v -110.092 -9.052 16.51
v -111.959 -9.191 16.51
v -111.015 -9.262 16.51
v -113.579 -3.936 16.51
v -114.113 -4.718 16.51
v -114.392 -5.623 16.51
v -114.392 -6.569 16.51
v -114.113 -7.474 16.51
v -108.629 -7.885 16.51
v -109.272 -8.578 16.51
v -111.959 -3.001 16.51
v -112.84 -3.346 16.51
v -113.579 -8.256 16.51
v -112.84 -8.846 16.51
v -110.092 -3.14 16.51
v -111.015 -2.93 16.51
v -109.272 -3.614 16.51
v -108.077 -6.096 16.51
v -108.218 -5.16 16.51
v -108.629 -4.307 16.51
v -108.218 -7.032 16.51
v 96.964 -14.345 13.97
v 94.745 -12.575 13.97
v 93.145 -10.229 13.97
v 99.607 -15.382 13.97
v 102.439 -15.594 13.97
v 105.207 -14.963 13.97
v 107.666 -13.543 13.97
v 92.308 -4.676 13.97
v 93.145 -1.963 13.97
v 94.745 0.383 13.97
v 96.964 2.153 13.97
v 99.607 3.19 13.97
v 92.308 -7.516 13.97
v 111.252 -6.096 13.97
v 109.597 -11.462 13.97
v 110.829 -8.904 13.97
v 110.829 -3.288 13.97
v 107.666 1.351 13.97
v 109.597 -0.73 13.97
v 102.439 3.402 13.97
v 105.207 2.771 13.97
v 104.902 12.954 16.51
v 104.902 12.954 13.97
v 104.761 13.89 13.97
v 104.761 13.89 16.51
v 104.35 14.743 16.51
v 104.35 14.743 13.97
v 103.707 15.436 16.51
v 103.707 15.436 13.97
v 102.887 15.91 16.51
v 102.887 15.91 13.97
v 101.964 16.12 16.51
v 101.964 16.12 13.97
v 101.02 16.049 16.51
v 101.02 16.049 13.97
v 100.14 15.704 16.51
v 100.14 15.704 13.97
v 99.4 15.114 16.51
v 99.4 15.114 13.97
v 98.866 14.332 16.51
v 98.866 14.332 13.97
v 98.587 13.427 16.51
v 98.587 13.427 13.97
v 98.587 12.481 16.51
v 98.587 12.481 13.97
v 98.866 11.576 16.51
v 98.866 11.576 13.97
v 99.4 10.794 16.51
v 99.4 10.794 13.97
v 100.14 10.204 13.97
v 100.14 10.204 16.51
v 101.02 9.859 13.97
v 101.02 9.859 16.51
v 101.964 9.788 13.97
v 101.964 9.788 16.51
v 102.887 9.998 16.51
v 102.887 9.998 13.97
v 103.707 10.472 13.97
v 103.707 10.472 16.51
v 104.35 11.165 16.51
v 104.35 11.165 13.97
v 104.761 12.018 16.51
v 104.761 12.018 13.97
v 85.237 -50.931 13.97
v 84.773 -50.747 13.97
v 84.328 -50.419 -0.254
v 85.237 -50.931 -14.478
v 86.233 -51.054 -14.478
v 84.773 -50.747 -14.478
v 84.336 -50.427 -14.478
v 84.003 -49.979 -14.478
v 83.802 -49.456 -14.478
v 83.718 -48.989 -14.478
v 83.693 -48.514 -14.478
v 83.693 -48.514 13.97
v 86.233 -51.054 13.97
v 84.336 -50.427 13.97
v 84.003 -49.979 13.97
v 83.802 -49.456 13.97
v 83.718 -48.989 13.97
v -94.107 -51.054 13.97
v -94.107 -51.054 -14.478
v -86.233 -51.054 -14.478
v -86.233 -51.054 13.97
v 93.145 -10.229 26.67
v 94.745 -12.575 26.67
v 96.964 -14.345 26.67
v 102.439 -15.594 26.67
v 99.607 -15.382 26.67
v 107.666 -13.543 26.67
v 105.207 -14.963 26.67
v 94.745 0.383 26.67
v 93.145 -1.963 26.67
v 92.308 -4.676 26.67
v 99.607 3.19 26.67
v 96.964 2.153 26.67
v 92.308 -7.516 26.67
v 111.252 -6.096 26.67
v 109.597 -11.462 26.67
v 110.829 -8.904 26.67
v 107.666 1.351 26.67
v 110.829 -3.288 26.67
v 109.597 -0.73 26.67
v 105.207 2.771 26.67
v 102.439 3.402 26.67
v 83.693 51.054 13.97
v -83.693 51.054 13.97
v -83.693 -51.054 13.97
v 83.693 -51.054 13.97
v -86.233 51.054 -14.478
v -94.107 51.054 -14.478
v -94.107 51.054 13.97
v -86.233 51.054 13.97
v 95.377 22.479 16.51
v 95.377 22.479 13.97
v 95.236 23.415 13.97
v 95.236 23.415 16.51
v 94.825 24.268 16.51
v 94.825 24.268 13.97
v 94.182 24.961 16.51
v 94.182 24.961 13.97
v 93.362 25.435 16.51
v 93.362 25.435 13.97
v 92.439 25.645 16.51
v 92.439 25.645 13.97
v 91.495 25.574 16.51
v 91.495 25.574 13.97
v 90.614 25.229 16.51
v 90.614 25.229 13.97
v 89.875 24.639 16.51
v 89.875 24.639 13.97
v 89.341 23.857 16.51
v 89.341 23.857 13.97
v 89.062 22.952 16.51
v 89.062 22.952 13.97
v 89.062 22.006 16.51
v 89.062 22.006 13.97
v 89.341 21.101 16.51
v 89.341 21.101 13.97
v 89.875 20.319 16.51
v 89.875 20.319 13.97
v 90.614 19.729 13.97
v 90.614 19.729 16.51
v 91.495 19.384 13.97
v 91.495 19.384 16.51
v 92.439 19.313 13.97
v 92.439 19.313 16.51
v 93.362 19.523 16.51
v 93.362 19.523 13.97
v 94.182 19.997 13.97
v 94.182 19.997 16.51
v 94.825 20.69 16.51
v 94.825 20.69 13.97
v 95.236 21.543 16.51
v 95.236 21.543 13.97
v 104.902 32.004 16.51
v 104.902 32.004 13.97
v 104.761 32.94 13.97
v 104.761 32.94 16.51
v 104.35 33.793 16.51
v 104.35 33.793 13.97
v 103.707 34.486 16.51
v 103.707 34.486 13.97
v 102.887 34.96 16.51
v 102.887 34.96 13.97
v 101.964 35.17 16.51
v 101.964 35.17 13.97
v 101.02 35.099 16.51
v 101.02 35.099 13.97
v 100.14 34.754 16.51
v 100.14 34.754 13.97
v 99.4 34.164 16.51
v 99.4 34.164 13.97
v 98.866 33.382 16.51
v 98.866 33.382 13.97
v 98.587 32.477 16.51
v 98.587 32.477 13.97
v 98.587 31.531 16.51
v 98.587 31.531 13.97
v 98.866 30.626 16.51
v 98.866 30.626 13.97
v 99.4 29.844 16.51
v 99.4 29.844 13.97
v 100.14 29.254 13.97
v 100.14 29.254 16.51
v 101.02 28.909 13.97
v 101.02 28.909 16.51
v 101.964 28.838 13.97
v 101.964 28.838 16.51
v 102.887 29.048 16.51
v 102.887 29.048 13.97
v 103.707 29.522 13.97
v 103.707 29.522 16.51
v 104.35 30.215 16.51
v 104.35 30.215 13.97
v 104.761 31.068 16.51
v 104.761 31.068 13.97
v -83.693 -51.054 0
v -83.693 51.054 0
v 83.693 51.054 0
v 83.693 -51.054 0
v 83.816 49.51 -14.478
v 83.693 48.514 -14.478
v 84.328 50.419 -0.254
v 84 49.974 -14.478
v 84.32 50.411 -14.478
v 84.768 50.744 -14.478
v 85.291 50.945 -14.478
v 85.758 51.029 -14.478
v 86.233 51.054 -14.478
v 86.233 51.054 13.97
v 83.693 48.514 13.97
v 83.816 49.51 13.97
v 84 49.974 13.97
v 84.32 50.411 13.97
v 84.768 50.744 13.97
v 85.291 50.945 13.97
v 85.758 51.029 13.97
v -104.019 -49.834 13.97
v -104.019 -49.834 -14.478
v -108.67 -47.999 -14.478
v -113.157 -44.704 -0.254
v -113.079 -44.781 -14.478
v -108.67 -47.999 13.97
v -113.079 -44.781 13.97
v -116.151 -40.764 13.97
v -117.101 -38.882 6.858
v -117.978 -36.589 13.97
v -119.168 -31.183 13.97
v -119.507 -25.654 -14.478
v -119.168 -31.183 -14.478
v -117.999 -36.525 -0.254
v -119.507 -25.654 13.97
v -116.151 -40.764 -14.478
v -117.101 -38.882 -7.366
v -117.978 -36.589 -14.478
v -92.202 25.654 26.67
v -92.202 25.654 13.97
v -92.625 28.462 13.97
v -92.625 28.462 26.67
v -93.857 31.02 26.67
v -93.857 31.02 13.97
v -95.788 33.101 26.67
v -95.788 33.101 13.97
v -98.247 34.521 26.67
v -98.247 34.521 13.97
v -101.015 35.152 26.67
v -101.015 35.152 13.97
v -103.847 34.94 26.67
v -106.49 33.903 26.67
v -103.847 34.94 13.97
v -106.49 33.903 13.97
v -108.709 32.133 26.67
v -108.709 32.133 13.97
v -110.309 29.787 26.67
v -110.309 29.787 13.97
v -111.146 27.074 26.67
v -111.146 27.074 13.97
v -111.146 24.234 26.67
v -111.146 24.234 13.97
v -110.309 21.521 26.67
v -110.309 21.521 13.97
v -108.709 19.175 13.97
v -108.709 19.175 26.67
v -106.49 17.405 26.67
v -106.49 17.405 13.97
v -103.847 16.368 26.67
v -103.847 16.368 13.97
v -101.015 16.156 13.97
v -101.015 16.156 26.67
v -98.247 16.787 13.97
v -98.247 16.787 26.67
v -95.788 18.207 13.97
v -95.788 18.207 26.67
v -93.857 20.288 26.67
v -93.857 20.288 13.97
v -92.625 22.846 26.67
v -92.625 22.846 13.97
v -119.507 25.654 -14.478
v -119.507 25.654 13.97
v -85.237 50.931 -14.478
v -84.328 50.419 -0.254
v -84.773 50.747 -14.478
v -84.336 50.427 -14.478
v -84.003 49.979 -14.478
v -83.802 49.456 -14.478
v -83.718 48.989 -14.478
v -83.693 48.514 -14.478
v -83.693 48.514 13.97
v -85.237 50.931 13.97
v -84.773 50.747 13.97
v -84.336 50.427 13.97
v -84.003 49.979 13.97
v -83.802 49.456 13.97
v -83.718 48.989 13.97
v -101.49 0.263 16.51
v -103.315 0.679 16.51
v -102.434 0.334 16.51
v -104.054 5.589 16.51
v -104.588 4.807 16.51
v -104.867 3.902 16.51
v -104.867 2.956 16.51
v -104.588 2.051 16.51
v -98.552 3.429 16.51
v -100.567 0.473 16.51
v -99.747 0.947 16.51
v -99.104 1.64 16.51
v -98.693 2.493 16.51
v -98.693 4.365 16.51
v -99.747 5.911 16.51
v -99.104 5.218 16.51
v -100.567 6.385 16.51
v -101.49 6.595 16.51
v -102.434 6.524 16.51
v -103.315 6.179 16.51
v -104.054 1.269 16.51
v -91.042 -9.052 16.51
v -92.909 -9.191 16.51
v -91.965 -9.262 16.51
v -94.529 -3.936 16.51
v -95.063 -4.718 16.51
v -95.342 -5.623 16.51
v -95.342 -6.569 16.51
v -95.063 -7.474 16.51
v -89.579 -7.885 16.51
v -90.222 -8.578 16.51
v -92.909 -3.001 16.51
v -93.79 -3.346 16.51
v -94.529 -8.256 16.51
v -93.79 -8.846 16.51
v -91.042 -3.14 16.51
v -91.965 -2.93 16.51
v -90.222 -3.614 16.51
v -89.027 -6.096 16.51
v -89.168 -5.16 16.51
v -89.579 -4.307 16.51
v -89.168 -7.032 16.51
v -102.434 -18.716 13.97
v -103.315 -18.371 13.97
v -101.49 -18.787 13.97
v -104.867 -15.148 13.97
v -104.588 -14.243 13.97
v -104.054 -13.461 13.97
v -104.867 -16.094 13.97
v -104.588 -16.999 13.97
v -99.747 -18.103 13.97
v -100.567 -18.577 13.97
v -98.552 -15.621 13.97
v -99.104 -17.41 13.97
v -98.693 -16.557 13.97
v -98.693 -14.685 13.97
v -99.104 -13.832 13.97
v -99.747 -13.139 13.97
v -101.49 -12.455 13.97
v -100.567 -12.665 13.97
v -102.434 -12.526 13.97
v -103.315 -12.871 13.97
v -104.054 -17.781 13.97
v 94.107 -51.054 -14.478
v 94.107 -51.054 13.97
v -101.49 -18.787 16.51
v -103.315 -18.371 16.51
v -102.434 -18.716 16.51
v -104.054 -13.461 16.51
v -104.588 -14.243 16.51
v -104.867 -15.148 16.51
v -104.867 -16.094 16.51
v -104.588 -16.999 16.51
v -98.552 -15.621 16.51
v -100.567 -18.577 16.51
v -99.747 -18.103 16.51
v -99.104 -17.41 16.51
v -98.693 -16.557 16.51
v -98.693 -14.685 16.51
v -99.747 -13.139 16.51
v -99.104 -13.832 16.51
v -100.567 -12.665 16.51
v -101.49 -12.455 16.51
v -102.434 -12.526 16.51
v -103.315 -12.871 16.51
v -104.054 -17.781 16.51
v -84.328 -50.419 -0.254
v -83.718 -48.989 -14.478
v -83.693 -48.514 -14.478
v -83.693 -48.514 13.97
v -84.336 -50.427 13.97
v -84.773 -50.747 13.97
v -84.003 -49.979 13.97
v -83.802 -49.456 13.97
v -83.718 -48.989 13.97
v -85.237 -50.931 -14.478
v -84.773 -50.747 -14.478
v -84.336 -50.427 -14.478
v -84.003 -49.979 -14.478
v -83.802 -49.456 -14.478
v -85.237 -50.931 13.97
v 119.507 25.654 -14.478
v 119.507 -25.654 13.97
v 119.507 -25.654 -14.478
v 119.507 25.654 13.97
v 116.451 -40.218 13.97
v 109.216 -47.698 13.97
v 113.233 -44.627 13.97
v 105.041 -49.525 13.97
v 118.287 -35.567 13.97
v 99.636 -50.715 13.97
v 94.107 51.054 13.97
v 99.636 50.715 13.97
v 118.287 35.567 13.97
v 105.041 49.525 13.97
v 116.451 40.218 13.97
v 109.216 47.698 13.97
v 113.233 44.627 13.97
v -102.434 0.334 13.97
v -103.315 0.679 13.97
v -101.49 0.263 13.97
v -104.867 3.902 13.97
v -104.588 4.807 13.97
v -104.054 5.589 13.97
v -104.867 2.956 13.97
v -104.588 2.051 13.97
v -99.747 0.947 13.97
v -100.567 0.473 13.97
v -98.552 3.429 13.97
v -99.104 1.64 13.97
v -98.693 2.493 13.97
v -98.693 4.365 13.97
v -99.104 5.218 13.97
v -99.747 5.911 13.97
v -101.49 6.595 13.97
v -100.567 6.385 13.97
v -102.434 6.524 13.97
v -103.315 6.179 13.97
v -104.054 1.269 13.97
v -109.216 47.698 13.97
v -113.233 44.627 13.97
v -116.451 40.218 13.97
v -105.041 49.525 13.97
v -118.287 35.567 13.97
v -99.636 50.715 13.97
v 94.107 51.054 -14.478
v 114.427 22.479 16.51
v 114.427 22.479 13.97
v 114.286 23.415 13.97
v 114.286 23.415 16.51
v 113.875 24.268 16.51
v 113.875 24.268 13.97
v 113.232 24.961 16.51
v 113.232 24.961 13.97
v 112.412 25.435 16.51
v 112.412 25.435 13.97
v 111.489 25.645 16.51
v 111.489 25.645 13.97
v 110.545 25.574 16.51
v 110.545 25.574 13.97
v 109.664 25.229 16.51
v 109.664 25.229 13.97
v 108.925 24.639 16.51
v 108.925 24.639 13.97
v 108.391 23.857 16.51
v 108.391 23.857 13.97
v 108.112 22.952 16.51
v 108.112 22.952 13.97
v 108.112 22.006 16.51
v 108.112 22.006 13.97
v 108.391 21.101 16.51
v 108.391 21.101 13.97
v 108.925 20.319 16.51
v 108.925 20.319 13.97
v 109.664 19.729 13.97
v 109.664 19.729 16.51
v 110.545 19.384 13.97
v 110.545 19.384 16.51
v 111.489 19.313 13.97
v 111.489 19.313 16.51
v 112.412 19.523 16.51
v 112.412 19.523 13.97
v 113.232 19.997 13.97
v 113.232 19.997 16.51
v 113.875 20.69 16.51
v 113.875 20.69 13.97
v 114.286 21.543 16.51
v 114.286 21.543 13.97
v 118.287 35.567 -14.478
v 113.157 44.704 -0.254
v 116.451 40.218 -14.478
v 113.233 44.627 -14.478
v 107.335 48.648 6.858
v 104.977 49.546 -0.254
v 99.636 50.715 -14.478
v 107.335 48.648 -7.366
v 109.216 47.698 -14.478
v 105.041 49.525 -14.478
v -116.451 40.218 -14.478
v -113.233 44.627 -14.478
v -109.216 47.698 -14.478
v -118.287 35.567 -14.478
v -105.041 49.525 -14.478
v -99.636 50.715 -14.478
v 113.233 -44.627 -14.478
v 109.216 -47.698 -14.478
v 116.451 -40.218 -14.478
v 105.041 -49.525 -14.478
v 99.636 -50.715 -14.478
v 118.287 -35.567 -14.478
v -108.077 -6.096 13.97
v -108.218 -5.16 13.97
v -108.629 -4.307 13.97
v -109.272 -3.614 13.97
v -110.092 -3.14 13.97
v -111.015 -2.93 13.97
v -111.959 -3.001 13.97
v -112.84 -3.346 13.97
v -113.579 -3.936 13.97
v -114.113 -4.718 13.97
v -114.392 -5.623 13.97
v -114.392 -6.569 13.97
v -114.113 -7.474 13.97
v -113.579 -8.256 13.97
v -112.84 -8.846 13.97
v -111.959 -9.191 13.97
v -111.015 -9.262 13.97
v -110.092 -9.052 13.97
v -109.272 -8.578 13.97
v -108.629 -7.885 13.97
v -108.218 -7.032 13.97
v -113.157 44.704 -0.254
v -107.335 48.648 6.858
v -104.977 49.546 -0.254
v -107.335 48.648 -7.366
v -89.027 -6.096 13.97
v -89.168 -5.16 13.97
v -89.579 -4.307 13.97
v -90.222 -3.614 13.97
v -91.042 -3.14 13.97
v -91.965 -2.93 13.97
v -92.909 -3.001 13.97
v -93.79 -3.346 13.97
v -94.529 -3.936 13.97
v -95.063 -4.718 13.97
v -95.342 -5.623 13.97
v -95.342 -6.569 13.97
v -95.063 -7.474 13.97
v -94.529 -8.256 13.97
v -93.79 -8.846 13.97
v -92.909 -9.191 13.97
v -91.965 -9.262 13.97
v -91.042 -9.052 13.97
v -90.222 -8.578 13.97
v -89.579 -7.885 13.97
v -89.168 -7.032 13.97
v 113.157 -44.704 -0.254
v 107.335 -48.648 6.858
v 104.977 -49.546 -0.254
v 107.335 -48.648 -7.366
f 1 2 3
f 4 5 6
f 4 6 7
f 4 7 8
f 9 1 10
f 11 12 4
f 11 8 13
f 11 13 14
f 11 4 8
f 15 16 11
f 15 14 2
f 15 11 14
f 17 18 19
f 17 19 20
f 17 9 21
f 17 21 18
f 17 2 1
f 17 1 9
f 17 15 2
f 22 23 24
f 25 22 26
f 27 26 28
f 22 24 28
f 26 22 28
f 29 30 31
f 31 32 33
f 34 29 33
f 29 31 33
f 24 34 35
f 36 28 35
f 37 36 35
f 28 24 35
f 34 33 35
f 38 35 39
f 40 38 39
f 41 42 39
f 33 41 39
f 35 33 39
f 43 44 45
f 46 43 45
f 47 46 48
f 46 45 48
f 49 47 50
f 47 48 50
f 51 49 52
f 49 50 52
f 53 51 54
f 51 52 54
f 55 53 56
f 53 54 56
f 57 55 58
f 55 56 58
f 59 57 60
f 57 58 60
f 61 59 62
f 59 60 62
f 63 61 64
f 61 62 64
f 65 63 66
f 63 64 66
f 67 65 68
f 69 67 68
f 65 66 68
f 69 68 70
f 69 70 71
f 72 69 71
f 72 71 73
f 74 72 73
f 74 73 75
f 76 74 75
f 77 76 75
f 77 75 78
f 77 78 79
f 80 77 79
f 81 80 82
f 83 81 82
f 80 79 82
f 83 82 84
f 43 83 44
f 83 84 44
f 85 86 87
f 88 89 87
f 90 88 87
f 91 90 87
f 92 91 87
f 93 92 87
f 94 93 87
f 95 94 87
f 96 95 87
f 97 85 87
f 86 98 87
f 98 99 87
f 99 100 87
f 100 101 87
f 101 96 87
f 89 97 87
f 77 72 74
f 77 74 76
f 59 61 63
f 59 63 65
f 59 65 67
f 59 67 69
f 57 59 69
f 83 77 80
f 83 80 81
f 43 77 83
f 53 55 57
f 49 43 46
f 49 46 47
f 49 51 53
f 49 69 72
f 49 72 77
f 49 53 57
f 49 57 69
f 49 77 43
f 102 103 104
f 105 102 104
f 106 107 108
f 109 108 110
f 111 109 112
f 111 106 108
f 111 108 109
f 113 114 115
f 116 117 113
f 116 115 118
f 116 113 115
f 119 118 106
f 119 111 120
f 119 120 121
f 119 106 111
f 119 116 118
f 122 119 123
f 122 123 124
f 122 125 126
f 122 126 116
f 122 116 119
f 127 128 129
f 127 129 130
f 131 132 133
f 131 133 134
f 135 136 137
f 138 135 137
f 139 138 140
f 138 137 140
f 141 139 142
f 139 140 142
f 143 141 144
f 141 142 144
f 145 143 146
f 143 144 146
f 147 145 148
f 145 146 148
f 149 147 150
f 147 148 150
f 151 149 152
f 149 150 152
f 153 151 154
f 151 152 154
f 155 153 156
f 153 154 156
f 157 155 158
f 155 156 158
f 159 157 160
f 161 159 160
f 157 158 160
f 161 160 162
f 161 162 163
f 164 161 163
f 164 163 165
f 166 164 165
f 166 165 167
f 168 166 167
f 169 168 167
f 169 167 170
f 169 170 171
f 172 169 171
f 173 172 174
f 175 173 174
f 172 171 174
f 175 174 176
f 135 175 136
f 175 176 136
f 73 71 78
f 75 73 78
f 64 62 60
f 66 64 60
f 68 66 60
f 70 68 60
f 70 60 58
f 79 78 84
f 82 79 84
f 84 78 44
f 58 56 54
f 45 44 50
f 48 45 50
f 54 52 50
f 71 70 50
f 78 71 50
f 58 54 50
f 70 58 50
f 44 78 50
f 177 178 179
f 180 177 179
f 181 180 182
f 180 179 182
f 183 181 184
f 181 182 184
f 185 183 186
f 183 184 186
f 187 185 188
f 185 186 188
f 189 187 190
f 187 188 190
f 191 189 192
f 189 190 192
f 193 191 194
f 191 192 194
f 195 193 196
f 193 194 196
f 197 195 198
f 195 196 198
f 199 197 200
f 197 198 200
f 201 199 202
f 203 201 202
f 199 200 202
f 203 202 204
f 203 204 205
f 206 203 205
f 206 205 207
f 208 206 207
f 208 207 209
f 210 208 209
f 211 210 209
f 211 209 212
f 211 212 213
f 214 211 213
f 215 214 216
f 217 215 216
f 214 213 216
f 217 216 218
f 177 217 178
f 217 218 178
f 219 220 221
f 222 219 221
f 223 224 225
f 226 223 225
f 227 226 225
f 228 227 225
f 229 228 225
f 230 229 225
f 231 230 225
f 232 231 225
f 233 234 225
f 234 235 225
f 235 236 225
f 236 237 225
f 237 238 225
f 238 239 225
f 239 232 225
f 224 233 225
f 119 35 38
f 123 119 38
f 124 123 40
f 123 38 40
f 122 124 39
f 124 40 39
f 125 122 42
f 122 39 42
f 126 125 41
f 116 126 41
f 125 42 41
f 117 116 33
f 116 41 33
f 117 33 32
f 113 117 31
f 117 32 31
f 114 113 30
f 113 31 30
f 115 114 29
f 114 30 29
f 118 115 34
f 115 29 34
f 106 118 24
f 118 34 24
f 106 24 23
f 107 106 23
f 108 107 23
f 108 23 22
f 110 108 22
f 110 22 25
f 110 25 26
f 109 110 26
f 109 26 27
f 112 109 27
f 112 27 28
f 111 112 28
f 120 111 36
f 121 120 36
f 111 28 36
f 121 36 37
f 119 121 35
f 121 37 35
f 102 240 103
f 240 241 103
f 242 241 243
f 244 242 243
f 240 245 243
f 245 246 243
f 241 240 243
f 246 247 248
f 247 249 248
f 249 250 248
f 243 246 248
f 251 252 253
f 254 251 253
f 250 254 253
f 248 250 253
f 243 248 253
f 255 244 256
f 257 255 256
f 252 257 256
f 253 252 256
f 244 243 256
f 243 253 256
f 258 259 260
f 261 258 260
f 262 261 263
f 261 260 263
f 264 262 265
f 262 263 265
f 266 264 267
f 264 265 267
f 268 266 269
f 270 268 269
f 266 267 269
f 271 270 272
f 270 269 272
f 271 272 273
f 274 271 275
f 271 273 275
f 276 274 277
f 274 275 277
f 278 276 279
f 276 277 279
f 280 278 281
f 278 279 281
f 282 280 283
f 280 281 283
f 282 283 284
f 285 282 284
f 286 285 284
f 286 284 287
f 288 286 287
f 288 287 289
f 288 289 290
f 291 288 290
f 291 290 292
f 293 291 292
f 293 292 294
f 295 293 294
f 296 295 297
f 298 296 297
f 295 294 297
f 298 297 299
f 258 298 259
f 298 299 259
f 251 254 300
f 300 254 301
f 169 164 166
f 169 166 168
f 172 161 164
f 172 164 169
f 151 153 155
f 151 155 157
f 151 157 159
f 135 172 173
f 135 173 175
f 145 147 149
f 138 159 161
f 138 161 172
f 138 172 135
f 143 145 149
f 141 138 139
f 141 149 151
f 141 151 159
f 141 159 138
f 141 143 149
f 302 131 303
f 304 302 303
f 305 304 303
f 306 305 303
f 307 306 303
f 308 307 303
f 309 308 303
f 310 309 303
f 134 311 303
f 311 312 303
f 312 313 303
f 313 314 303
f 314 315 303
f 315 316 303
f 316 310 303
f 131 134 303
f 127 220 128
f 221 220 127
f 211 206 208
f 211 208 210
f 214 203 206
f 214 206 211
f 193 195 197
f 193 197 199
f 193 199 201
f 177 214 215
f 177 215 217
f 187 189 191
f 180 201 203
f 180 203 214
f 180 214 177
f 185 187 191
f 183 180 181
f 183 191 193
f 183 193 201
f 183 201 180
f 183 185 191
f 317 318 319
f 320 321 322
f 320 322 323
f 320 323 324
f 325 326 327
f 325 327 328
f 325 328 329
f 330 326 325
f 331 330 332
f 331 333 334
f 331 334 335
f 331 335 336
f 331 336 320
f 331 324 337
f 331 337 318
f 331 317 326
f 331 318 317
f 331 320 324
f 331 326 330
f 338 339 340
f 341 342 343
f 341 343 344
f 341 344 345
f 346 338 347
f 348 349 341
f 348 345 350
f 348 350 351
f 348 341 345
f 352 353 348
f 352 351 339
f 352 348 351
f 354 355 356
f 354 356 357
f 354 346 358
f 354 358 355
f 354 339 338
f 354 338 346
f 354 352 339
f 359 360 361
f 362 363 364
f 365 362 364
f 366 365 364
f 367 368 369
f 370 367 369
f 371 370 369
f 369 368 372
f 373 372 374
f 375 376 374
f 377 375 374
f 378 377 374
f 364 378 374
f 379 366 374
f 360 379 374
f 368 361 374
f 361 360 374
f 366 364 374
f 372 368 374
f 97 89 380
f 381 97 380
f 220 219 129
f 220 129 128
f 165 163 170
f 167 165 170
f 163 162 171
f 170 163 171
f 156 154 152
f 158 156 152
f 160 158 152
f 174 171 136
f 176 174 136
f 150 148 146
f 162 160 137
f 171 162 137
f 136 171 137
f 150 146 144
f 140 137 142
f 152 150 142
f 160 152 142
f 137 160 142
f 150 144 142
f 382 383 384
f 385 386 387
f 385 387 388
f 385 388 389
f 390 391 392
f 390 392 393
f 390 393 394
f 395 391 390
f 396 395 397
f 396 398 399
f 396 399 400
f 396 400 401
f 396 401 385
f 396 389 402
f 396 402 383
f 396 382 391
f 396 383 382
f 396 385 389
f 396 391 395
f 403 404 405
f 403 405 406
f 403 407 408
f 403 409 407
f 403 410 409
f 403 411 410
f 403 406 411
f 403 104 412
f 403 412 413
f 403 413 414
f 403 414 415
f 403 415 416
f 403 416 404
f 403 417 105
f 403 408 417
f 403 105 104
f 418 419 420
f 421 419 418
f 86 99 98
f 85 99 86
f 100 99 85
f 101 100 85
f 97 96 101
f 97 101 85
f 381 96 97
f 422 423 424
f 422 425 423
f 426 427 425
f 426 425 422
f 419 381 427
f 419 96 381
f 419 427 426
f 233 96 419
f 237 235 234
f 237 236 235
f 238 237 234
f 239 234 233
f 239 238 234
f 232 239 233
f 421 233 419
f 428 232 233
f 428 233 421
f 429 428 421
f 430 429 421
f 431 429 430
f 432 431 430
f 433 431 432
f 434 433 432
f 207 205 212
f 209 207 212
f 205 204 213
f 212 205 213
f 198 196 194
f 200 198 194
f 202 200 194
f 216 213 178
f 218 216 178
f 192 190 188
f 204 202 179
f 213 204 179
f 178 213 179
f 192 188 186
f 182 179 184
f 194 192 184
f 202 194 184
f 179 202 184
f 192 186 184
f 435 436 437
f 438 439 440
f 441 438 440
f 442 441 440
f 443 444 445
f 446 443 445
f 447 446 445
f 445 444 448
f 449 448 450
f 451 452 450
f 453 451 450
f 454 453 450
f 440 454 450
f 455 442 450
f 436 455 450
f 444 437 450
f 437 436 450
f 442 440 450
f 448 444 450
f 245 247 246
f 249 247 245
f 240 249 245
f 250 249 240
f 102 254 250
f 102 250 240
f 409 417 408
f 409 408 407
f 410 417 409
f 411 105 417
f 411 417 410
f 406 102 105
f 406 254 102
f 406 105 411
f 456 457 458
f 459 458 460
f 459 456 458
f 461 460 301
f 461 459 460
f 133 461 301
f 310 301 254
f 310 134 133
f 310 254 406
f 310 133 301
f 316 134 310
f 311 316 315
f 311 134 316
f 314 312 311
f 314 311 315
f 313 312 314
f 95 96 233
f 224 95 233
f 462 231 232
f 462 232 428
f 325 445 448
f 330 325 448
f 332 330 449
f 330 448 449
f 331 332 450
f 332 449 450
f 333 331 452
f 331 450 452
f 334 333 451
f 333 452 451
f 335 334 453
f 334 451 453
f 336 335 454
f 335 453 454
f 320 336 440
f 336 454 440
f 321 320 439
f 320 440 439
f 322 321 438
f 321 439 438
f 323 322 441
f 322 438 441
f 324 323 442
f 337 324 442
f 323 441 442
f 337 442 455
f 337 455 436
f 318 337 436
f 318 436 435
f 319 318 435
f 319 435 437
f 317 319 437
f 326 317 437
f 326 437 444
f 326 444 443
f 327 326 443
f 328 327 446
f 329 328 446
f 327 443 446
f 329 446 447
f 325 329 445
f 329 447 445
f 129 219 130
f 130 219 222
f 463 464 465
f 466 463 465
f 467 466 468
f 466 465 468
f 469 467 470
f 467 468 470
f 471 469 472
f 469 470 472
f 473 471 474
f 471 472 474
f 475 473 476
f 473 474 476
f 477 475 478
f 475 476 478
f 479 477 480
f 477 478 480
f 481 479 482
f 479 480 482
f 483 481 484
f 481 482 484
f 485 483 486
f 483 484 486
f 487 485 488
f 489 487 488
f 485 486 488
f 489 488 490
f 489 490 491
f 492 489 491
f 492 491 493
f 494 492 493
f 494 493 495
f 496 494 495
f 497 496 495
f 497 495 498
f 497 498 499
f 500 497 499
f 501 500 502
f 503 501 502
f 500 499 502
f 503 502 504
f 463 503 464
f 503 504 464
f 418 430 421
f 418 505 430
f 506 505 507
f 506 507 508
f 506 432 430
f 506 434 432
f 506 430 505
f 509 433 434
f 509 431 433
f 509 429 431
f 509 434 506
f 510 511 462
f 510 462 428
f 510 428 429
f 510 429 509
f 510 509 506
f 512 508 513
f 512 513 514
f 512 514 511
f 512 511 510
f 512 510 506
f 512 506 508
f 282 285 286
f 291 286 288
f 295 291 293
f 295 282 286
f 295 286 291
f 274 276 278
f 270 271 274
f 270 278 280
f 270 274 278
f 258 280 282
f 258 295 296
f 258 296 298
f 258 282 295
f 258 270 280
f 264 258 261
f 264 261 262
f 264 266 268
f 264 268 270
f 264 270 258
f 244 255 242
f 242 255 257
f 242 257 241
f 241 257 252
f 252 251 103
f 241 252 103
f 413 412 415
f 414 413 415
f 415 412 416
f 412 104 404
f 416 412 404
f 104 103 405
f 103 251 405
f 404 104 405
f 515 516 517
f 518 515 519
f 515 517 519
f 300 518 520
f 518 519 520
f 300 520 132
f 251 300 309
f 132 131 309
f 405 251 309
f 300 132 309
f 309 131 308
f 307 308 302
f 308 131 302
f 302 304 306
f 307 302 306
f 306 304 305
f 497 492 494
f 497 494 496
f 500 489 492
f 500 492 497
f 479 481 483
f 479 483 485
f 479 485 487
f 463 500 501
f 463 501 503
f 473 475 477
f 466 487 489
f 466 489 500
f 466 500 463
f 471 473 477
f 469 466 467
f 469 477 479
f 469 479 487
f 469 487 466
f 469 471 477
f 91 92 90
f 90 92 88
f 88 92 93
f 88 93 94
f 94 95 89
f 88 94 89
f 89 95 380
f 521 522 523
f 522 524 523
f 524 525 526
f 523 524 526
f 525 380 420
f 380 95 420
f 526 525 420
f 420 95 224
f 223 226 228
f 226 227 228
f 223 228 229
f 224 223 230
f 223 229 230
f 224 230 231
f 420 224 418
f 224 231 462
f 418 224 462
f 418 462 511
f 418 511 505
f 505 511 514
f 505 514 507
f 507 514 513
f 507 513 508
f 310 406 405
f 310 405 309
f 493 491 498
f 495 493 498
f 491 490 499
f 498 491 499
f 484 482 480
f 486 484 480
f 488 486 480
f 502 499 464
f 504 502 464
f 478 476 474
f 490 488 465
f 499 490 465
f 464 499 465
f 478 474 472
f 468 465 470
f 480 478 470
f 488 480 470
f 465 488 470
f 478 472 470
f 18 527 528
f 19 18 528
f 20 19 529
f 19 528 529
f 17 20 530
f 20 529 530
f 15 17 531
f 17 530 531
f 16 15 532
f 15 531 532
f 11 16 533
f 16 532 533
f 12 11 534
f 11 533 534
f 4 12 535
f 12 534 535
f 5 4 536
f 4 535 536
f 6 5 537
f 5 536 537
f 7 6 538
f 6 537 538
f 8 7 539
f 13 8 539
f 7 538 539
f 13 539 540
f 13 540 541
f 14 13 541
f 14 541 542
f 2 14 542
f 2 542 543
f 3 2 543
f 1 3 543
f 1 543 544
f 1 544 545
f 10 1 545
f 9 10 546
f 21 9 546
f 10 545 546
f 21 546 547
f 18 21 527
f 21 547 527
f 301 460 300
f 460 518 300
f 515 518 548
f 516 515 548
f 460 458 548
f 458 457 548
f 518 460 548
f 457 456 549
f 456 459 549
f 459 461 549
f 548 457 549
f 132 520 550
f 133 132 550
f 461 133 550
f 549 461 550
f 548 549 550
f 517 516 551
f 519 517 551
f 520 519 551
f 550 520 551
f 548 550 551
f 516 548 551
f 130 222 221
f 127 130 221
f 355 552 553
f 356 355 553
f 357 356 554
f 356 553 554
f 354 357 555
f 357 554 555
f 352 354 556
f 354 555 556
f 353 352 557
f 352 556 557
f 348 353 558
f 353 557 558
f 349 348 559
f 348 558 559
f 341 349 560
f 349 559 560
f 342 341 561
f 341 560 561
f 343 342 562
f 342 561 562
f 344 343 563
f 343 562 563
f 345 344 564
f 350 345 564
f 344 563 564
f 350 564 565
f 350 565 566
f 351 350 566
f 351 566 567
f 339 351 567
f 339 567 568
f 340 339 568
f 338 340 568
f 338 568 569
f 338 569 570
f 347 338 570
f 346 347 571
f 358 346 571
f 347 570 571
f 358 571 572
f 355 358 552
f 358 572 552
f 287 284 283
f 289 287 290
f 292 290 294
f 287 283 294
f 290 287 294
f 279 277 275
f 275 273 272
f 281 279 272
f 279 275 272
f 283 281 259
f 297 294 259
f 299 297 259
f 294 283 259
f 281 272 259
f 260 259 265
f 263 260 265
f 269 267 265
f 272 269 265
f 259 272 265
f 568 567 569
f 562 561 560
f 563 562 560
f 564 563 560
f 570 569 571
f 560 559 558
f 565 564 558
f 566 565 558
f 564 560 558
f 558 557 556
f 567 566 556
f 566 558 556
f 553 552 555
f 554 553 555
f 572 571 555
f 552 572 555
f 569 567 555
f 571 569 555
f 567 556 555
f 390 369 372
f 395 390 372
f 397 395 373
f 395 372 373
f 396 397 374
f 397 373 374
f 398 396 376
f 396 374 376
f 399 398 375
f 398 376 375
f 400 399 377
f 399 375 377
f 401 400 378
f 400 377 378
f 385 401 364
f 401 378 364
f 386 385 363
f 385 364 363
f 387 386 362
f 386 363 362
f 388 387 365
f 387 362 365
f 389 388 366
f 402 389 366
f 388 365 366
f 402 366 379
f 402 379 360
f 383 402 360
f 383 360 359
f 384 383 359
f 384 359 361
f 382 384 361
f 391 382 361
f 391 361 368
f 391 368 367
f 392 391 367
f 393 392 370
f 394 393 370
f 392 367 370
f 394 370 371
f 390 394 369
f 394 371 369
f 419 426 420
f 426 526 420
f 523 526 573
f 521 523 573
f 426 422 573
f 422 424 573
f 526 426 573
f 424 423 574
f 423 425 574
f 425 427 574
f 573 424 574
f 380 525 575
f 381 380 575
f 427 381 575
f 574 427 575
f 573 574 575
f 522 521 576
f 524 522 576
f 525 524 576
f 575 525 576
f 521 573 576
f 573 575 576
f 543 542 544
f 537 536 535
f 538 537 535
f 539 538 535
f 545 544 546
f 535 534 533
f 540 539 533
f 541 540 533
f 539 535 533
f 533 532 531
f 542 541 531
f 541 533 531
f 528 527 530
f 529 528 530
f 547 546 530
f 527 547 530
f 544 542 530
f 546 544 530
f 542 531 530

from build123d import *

# Parameters (mm, degrees)
F0_W          = 167.386
F0_H          = 102.108
F1_DEPTH      = 13.97
F2_W          = 35.814
F2_H          = 102.108
F3_DEPTH      = 28.448
F4_W          = 35.814
F4_H          = 102.108
F5_DEPTH      = 28.448
F6_T1_DEPTH   = 155.448
F6_2_T1_DEPTH = 155.448
F7_T1_DEPTH   = 41.148
F7_2_T1_DEPTH = 41.148
F8_R          = 9.525
F9_DEPTH      = 12.7
F10_R         = 3.175
F14_DEPTH     = 2.54
F11_R         = 3.175
F15_DEPTH     = 2.54
F12_R         = 3.175
F13_R         = 3.175
F16_DEPTH     = 2.54
F17_R         = 3.175
F22_DEPTH     = 2.54
F19_R         = 3.175
F23_DEPTH     = 2.54
F20_R         = 3.175
F24_DEPTH     = 2.54
F21_R         = 9.525
F25_DEPTH     = 12.7
F26_R         = 3.175
F27_DEPTH     = 2.54


# Not quite as in the source:
# - a fillet or chamfer that OpenCascade refuses, or shapes differently, is made with other operations: its cross-section is extruded or revolved along the edge and cut away or added


with BuildPart() as f1:
    # F0 (on Top) → F1 (new body)
    with BuildSketch(Plane.XY):
        Rectangle(F0_W, F0_H)
    extrude(amount=F1_DEPTH)


with BuildPart() as f3:
    # F2 (on face) → F3 (new body)
    with BuildSketch(Plane.XY.offset(13.97)):
        with Locations((-101.6, 0)):
            Rectangle(F2_W, F2_H)
    extrude(amount=-F3_DEPTH)

    # F6: fillet of radius 25.4 on 2 edges, made by hand

    # F6_s2 → F6_t1 (cut)
    with BuildSketch(Plane.XY.offset(-77.978)):
        with BuildLine():
            add(Edge.make_bspline(
                [(-94.107, 51.054), (-119.507, 51.054), (-119.507, 25.654)],
                knots=[0, 0, 0, 1, 1, 1], degree=2, weights=[1, 1, 1]))
            Line((-119.507, 25.654), (-119.507, 51.054))
            Line((-119.507, 51.054), (-94.107, 51.054))
        make_face()
        with BuildLine():
            add(Edge.make_bspline(
                [(-119.507, -25.654), (-119.507, -51.054), (-94.107, -51.054)],
                knots=[0, 0, 0, 1, 1, 1], degree=2, weights=[1, 1, 1]))
            Line((-94.107, -51.054), (-119.507, -51.054))
            Line((-119.507, -51.054), (-119.507, -25.654))
        make_face()
    extrude(amount=F6_T1_DEPTH, mode=Mode.SUBTRACT)

    # F7: fillet of radius 2.54 on 2 edges, made by hand

    # F7_s2 → F7_t1 (cut)
    with BuildSketch(Plane.XY.offset(-20.828)):
        with BuildLine():
            add(Edge.make_bspline(
                [(-83.693, 48.514), (-83.693, 51.054), (-86.233, 51.054)],
                knots=[0, 0, 0, 1, 1, 1], degree=2, weights=[1, 1, 1]))
            Line((-86.233, 51.054), (-83.693, 51.054))
            Line((-83.693, 51.054), (-83.693, 48.514))
        make_face()
        with BuildLine():
            add(Edge.make_bspline(
                [(-83.693, -48.514), (-83.693, -51.054), (-86.233, -51.054)],
                knots=[0, 0, 0, 1, 1, 1], degree=2, weights=[1, 1, 1]))
            Line((-86.233, -51.054), (-83.693, -51.054))
            Line((-83.693, -51.054), (-83.693, -48.514))
        make_face()
    extrude(amount=F7_T1_DEPTH, mode=Mode.SUBTRACT)


with BuildPart() as f5:
    # F4 (on face) → F5 (new body)
    with BuildSketch(Plane.XY.offset(13.97)):
        with Locations((101.6, 0)):
            Rectangle(F4_W, F4_H)
    extrude(amount=-F5_DEPTH)

    # F6#2: fillet of radius 25.4 on 2 edges, made by hand

    # F6_2_s2 → F6_2_t1 (cut)
    with BuildSketch(Plane.XY.offset(-77.978)):
        with BuildLine():
            add(Edge.make_bspline(
                [(94.107, 51.054), (119.507, 51.054), (119.507, 25.654)],
                knots=[0, 0, 0, 1, 1, 1], degree=2, weights=[1, 1, 1]))
            Line((119.507, 25.654), (119.507, 51.054))
            Line((119.507, 51.054), (94.107, 51.054))
        make_face()
        with BuildLine():
            add(Edge.make_bspline(
                [(94.107, -51.054), (119.507, -51.054), (119.507, -25.654)],
                knots=[0, 0, 0, 1, 1, 1], degree=2, weights=[1, 1, 1]))
            Line((119.507, -25.654), (119.507, -51.054))
            Line((119.507, -51.054), (94.107, -51.054))
        make_face()
    extrude(amount=F6_2_T1_DEPTH, mode=Mode.SUBTRACT)

    # F7#2: fillet of radius 2.54 on 2 edges, made by hand

    # F7_2_s2 → F7_2_t1 (cut)
    with BuildSketch(Plane.XY.offset(-20.828)):
        with BuildLine():
            add(Edge.make_bspline(
                [(86.233, 51.054), (83.693, 51.054), (83.693, 48.514)],
                knots=[0, 0, 0, 1, 1, 1], degree=2, weights=[1, 1, 1]))
            Line((83.693, 48.514), (83.693, 51.054))
            Line((83.693, 51.054), (86.233, 51.054))
        make_face()
        with BuildLine():
            add(Edge.make_bspline(
                [(83.693, -48.514), (83.693, -51.054), (86.233, -51.054)],
                knots=[0, 0, 0, 1, 1, 1], degree=2, weights=[1, 1, 1]))
            Line((86.233, -51.054), (83.693, -51.054))
            Line((83.693, -51.054), (83.693, -48.514))
        make_face()
    extrude(amount=F7_2_T1_DEPTH, mode=Mode.SUBTRACT)


with BuildPart() as f9:
    # F8 (on face) → F9 (new body)
    with BuildSketch(Plane.XY.offset(13.97)):
        with Locations((-101.727, 25.654)):
            Circle(F8_R)
    extrude(amount=F9_DEPTH)


with BuildPart() as f14:
    # F10 (on face) → F14 (new body)
    with BuildSketch(Plane.XY.offset(13.97)):
        with Locations((-101.727, 3.429)):
            Circle(F10_R)
    extrude(amount=F14_DEPTH)


with BuildPart() as f15:
    # F11 (on face) → F15 (new body)
    with BuildSketch(Plane.XY.offset(13.97)):
        with Locations((-101.727, -15.621)):
            Circle(F11_R)
    extrude(amount=F15_DEPTH)


with BuildPart() as f15b:
    # F12 (on face) → F15, piece 2 (new body)
    with BuildSketch(Plane.XY.offset(13.97)):
        with Locations((-92.202, -6.096)):
            Circle(F12_R)
    extrude(amount=F15_DEPTH)


with BuildPart() as f16:
    # F13 (on face) → F16 (new body)
    with BuildSketch(Plane.XY.offset(13.97)):
        with Locations((-111.252, -6.096)):
            Circle(F13_R)
    extrude(amount=F16_DEPTH)


with BuildPart() as f22:
    # F17 (on face) → F22 (new body)
    with BuildSketch(Plane.XY.offset(13.97)):
        with Locations((101.727, 32.004)):
            Circle(F17_R)
    extrude(amount=F22_DEPTH)


with BuildPart() as f23:
    # F19 (on face) → F23 (new body)
    with BuildSketch(Plane.XY.offset(13.97)):
        with Locations((92.202, 22.479)):
            Circle(F19_R)
    extrude(amount=F23_DEPTH)


with BuildPart() as f24:
    # F20 (on face) → F24 (new body)
    with BuildSketch(Plane.XY.offset(13.97)):
        with Locations((101.727, 12.954)):
            Circle(F20_R)
    extrude(amount=F24_DEPTH)


with BuildPart() as f25:
    # F21 (on face) → F25 (new body)
    with BuildSketch(Plane.XY.offset(13.97)):
        with Locations((101.727, -6.096)):
            Circle(F21_R)
    extrude(amount=F25_DEPTH)


with BuildPart() as f27:
    # F26 (on face) → F27 (new body)
    with BuildSketch(Plane.XY.offset(13.97)):
        with Locations((111.252, 22.479)):
            Circle(F26_R)
    extrude(amount=F27_DEPTH)


solid = Compound([f1.part, f3.part, f5.part, f9.part, f14.part, f15.part, f15b.part, f16.part, f22.part, f23.part, f24.part, f25.part, f27.part])
